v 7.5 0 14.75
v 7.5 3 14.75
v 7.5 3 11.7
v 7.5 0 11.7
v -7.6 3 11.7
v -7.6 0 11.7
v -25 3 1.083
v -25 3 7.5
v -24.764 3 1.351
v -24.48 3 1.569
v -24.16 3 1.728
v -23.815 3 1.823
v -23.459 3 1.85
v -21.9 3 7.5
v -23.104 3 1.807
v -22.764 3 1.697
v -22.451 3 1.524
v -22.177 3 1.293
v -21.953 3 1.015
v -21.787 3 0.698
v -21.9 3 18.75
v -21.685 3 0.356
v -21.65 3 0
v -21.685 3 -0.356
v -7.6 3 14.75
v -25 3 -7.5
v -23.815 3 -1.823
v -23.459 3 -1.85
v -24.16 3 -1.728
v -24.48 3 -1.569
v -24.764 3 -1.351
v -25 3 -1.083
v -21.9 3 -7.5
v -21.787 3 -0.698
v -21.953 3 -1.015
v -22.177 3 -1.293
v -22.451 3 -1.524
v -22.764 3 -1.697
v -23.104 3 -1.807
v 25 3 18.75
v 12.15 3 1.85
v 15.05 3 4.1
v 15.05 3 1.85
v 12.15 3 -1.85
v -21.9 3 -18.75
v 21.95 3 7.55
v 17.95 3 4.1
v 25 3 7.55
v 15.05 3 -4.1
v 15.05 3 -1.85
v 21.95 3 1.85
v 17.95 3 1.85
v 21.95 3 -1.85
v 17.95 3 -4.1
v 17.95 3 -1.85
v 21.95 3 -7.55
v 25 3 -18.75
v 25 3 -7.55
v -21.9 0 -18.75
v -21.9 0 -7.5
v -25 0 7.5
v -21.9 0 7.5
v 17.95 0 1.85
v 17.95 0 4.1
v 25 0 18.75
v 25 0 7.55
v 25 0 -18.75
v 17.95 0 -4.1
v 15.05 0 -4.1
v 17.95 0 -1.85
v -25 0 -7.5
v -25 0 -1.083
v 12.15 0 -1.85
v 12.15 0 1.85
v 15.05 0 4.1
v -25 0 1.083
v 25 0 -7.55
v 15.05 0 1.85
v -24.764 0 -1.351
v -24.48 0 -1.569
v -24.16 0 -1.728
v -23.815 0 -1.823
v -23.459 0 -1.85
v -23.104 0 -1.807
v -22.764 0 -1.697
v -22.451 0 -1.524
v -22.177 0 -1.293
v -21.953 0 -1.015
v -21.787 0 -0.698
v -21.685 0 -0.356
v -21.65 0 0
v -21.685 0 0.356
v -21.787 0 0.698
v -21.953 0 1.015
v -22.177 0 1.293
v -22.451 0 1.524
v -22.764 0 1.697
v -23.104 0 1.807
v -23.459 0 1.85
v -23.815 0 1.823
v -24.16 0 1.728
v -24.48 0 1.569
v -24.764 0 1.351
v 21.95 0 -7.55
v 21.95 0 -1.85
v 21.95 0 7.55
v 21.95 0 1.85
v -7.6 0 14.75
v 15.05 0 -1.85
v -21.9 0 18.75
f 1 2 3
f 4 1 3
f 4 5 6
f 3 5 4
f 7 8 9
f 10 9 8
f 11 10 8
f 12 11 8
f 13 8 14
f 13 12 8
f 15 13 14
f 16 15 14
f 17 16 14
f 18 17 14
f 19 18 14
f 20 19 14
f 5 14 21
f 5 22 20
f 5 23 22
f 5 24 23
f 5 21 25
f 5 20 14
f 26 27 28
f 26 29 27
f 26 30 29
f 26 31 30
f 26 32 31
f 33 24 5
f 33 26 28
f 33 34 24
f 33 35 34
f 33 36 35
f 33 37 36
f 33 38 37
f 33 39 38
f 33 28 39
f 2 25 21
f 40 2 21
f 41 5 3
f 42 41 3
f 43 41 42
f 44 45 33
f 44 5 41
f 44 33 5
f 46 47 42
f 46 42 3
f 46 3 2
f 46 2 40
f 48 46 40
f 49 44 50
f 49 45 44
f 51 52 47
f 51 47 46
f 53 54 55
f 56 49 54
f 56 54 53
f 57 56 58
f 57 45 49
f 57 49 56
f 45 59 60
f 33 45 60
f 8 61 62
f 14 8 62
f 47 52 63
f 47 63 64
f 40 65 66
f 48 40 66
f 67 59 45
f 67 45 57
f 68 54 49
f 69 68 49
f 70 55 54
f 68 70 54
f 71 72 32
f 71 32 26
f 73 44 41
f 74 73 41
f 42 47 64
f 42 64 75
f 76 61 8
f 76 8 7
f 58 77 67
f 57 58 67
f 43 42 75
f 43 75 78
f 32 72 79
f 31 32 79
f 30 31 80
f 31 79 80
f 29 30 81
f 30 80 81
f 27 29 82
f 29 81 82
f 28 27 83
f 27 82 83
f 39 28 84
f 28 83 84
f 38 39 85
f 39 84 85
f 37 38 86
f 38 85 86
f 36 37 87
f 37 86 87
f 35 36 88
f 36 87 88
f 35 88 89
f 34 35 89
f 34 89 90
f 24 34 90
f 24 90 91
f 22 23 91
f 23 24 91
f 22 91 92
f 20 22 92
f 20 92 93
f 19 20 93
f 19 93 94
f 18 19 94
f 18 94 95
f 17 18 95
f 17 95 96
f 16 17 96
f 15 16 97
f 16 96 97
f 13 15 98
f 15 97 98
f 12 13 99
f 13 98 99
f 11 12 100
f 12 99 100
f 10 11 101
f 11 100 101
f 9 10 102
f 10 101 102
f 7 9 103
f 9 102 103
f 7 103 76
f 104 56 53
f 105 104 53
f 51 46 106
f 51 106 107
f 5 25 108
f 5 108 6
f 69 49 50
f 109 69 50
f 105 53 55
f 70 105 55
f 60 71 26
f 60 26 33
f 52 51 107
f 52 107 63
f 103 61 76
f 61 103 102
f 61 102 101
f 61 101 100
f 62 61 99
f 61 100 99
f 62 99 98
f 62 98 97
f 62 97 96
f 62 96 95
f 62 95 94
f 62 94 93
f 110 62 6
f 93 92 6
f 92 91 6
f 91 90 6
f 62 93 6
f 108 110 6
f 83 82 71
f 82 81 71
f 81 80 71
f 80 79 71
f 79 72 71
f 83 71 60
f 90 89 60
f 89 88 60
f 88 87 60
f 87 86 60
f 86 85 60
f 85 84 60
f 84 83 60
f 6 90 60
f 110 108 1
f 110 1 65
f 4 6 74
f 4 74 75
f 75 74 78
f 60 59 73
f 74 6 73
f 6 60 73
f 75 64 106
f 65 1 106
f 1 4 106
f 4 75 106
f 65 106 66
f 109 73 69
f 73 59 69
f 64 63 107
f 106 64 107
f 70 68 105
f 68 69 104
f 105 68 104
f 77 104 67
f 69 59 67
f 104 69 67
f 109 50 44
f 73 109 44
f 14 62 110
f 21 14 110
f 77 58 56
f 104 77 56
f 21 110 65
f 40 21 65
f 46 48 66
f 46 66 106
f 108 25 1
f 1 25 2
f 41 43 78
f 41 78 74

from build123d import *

# Parameters (mm, degrees)
SKETCH1_W           = 50
SKETCH1_H           = 37.5
BOSS_EXTRUDE1_DEPTH = 3
SKETCH2_W           = 15.1
SKETCH2_H           = 3.05
CUT_EXTRUDE1_DEPTH  = 32.393669744
CUT_EXTRUDE2_DEPTH  = 32.393669744
SKETCH4_W           = 3.1
SKETCH4_H           = 11.25
CUT_EXTRUDE3_DEPTH  = 32.393669744
SKETCH5_R           = 1.85
CUT_EXTRUDE4_DEPTH  = 32.393669744


with BuildPart() as part:
    # Sketch1 → Boss-Extrude1 (new body)
    with BuildSketch(Plane(origin=(0, 0, 0), x_dir=(1, 0, 0), z_dir=(0, 1, 0))):
        Rectangle(SKETCH1_W, SKETCH1_H)
    extrude(amount=BOSS_EXTRUDE1_DEPTH)

    # Sketch2 → Cut-Extrude1 (cut, through all)
    with BuildSketch(Plane(origin=(0, 3, 0), x_dir=(1, 0, 0), z_dir=(0, 1, 0))):
        with Locations((-0.05, -13.225)):
            Rectangle(SKETCH2_W, SKETCH2_H)
    extrude(amount=-CUT_EXTRUDE1_DEPTH, mode=Mode.SUBTRACT)

    # Sketch3 → Cut-Extrude2 (cut, through all)
    with BuildSketch(Plane(origin=(0, 3, 0), x_dir=(1, 0, 0), z_dir=(0, 1, 0))):
        Polygon((25, 7.55), (21.95, 7.55), (21.95, 1.85), (17.95, 1.85), (17.95, 4.1), (15.05, 4.1), (15.05, 1.85), (12.15, 1.85), (12.15, 0), (25, 0), align=None)
    cut_extrude2 = extrude(amount=-CUT_EXTRUDE2_DEPTH, mode=Mode.SUBTRACT)

    # Mirror1: Cut-Extrude2 across plane
    add(cut_extrude2.mirror(Plane.XY), mode=Mode.SUBTRACT)

    # Sketch4 → Cut-Extrude3 (cut, through all)
    with BuildSketch(Plane.XZ):
        with Locations((-23.45, -13.125)):
            Rectangle(SKETCH4_W, SKETCH4_H)
        with Locations((-23.45, 13.125)):
            Rectangle(SKETCH4_W, SKETCH4_H)
    extrude(amount=-CUT_EXTRUDE3_DEPTH, mode=Mode.SUBTRACT)

    # Sketch5 → Cut-Extrude4 (cut, through all)
    with BuildSketch(Plane.XZ):
        with Locations((-23.5, 0)):
            Circle(SKETCH5_R)
    extrude(amount=-CUT_EXTRUDE4_DEPTH, mode=Mode.SUBTRACT)


solid = part.part
